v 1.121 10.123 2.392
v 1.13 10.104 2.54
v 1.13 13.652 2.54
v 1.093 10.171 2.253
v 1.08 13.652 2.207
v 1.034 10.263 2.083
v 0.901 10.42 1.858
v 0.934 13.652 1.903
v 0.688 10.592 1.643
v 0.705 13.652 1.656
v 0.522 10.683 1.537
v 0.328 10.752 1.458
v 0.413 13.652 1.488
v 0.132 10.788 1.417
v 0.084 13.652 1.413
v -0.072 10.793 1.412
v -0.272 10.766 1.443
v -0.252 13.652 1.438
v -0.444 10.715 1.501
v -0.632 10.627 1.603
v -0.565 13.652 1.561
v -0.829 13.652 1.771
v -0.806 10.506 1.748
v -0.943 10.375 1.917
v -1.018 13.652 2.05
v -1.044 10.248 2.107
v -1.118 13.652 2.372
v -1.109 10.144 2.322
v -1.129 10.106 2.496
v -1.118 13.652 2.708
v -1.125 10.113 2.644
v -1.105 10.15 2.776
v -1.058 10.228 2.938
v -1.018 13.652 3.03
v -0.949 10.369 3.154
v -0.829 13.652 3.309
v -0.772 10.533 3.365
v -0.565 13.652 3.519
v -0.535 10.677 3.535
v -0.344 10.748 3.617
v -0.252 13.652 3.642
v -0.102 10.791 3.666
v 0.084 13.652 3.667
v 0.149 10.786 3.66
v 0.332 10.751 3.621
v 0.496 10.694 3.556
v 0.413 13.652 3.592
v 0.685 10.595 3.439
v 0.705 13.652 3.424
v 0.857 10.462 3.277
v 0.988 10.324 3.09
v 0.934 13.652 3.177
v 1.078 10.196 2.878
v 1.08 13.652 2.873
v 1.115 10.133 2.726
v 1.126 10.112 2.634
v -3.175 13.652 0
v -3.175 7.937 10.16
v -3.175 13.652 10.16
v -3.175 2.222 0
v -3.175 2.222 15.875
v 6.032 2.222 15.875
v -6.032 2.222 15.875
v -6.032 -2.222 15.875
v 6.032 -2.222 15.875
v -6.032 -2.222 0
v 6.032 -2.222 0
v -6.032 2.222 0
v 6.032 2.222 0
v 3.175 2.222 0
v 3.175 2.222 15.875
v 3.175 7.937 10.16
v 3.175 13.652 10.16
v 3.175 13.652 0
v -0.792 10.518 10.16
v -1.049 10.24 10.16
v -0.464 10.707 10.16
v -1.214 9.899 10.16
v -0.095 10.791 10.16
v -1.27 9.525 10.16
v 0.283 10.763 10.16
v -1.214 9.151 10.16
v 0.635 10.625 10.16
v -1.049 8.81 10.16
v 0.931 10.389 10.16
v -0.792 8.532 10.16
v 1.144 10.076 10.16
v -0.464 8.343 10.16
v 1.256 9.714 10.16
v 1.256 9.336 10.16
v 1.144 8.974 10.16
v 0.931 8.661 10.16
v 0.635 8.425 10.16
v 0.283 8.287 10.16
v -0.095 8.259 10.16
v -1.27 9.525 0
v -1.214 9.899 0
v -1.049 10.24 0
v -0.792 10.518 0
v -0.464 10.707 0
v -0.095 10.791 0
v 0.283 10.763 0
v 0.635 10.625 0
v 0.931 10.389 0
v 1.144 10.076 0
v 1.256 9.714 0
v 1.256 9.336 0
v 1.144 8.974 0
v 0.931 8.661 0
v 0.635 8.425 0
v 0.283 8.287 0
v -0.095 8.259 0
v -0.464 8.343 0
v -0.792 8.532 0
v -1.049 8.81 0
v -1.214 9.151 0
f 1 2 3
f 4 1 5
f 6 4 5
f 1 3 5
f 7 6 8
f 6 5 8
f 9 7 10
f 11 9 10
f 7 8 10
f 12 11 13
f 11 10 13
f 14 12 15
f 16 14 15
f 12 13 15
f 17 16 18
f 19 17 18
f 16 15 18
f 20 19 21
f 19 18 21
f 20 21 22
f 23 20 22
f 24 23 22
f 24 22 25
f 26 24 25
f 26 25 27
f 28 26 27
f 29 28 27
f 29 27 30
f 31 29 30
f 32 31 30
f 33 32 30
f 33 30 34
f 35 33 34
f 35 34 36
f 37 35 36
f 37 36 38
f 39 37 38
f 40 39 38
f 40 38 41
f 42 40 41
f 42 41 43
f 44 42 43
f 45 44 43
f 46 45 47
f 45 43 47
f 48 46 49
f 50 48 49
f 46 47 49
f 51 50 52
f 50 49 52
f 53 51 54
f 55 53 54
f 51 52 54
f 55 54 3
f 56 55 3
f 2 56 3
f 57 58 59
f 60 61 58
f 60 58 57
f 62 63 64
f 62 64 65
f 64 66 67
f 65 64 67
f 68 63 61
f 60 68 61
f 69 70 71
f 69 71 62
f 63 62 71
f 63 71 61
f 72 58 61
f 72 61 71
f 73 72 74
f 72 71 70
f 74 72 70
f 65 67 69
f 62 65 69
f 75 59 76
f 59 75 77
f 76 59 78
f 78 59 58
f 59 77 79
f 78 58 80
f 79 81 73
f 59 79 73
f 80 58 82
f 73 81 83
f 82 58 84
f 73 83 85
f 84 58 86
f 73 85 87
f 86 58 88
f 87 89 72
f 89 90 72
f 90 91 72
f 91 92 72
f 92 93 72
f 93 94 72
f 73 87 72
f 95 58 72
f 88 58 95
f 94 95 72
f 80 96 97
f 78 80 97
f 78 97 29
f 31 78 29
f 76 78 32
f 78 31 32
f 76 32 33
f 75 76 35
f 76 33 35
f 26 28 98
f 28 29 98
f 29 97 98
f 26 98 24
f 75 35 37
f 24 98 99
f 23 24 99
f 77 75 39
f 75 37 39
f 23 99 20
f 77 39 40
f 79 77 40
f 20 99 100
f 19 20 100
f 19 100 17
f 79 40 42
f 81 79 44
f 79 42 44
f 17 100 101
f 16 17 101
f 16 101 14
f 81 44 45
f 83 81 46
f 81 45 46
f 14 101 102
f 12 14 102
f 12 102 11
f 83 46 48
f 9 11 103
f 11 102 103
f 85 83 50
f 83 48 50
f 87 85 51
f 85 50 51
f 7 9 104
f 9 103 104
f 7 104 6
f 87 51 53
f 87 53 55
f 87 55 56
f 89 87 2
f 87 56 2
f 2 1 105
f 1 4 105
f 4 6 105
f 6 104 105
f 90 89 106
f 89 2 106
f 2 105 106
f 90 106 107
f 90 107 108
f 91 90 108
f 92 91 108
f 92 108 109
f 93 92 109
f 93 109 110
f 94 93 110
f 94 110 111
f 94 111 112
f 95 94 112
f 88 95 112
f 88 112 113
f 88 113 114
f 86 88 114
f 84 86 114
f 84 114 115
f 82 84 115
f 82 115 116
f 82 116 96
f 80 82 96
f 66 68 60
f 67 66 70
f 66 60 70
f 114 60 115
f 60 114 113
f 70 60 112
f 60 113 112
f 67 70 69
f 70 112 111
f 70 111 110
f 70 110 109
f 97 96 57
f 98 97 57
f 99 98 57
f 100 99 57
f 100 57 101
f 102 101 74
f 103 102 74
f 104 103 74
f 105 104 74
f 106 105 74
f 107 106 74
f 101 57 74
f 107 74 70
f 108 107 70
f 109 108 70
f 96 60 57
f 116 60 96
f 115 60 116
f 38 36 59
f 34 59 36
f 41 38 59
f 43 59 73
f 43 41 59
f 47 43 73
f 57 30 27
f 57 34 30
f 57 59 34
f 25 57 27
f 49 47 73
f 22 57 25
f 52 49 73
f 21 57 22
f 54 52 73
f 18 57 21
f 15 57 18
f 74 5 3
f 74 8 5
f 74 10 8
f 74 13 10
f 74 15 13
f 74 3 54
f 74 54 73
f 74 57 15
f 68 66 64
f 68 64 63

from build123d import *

# Parameters (mm, degrees)
SKETCH1_W                  = 12.065
SKETCH1_H                  = 4.445
BASE_DEPTH                 = 15.875
SKETCH7_W                  = 6.35
SKETCH7_H                  = 10.16
BOSS_EXTRUDE1_DEPTH        = 11.43
SKETCH3_R                  = 1.27
SHAFTHOLE_DEPTH            = 22.78984712
F_4_40_TAPPED_HOLE1_REACH  = 25.247
F_4_40_TAPPED_HOLE1_BORE_R = 1.1303
CHAMFER1_SIZE              = 5.715


with BuildPart() as part:
    # Sketch1 → Base (new body)
    with BuildSketch(Plane.XY):
        Rectangle(SKETCH1_W, SKETCH1_H)
    extrude(amount=BASE_DEPTH)

    # Sketch7 → Boss-Extrude1 (add)
    with BuildSketch(Plane(origin=(0, 2.2225, 0), x_dir=(1, 0, 0), z_dir=(0, 1, 0))):
        with Locations((0, -5.08)):
            Rectangle(SKETCH7_W, SKETCH7_H)
    extrude(amount=BOSS_EXTRUDE1_DEPTH)

    # Sketch3 → ShaftHole (cut, through all)
    with BuildSketch(Plane(origin=(0, 0, 0), x_dir=(-1, 0, 0), z_dir=(0, 0, -1))):
        with Locations((0, 9.525)):
            Circle(SKETCH3_R)
    extrude(amount=-SHAFTHOLE_DEPTH, mode=Mode.SUBTRACT)

    # #4-40 Tapped Hole1 bore → #4-40 Tapped Hole1 (cut, up to next)
    with BuildSketch(Plane(origin=(0, 13.6525, 0), x_dir=(1, 0, 0), z_dir=(0, 1, 0)), mode=Mode.PRIVATE) as f_4_40_tapped_hole1_sk1:
        with Locations((0, -2.54)):
            Circle(F_4_40_TAPPED_HOLE1_BORE_R)
    f_4_40_tapped_hole1_tool1 = extrude(f_4_40_tapped_hole1_sk1.sketch, amount=-F_4_40_TAPPED_HOLE1_REACH, mode=Mode.PRIVATE) & part.part
    add(f_4_40_tapped_hole1_tool1.solids().sort_by_distance((0, 13.6525, 2.54))[0], mode=Mode.SUBTRACT)

    # Chamfer1
    chamfer1_edges = [part.edges().sort_by_distance(p)[0] for p in [
        (0, 2.2225, 10.16),
    ]]
    chamfer(chamfer1_edges, length=CHAMFER1_SIZE - 0.0001)  # a hair under: the kernel refuses the full size


solid = part.part
